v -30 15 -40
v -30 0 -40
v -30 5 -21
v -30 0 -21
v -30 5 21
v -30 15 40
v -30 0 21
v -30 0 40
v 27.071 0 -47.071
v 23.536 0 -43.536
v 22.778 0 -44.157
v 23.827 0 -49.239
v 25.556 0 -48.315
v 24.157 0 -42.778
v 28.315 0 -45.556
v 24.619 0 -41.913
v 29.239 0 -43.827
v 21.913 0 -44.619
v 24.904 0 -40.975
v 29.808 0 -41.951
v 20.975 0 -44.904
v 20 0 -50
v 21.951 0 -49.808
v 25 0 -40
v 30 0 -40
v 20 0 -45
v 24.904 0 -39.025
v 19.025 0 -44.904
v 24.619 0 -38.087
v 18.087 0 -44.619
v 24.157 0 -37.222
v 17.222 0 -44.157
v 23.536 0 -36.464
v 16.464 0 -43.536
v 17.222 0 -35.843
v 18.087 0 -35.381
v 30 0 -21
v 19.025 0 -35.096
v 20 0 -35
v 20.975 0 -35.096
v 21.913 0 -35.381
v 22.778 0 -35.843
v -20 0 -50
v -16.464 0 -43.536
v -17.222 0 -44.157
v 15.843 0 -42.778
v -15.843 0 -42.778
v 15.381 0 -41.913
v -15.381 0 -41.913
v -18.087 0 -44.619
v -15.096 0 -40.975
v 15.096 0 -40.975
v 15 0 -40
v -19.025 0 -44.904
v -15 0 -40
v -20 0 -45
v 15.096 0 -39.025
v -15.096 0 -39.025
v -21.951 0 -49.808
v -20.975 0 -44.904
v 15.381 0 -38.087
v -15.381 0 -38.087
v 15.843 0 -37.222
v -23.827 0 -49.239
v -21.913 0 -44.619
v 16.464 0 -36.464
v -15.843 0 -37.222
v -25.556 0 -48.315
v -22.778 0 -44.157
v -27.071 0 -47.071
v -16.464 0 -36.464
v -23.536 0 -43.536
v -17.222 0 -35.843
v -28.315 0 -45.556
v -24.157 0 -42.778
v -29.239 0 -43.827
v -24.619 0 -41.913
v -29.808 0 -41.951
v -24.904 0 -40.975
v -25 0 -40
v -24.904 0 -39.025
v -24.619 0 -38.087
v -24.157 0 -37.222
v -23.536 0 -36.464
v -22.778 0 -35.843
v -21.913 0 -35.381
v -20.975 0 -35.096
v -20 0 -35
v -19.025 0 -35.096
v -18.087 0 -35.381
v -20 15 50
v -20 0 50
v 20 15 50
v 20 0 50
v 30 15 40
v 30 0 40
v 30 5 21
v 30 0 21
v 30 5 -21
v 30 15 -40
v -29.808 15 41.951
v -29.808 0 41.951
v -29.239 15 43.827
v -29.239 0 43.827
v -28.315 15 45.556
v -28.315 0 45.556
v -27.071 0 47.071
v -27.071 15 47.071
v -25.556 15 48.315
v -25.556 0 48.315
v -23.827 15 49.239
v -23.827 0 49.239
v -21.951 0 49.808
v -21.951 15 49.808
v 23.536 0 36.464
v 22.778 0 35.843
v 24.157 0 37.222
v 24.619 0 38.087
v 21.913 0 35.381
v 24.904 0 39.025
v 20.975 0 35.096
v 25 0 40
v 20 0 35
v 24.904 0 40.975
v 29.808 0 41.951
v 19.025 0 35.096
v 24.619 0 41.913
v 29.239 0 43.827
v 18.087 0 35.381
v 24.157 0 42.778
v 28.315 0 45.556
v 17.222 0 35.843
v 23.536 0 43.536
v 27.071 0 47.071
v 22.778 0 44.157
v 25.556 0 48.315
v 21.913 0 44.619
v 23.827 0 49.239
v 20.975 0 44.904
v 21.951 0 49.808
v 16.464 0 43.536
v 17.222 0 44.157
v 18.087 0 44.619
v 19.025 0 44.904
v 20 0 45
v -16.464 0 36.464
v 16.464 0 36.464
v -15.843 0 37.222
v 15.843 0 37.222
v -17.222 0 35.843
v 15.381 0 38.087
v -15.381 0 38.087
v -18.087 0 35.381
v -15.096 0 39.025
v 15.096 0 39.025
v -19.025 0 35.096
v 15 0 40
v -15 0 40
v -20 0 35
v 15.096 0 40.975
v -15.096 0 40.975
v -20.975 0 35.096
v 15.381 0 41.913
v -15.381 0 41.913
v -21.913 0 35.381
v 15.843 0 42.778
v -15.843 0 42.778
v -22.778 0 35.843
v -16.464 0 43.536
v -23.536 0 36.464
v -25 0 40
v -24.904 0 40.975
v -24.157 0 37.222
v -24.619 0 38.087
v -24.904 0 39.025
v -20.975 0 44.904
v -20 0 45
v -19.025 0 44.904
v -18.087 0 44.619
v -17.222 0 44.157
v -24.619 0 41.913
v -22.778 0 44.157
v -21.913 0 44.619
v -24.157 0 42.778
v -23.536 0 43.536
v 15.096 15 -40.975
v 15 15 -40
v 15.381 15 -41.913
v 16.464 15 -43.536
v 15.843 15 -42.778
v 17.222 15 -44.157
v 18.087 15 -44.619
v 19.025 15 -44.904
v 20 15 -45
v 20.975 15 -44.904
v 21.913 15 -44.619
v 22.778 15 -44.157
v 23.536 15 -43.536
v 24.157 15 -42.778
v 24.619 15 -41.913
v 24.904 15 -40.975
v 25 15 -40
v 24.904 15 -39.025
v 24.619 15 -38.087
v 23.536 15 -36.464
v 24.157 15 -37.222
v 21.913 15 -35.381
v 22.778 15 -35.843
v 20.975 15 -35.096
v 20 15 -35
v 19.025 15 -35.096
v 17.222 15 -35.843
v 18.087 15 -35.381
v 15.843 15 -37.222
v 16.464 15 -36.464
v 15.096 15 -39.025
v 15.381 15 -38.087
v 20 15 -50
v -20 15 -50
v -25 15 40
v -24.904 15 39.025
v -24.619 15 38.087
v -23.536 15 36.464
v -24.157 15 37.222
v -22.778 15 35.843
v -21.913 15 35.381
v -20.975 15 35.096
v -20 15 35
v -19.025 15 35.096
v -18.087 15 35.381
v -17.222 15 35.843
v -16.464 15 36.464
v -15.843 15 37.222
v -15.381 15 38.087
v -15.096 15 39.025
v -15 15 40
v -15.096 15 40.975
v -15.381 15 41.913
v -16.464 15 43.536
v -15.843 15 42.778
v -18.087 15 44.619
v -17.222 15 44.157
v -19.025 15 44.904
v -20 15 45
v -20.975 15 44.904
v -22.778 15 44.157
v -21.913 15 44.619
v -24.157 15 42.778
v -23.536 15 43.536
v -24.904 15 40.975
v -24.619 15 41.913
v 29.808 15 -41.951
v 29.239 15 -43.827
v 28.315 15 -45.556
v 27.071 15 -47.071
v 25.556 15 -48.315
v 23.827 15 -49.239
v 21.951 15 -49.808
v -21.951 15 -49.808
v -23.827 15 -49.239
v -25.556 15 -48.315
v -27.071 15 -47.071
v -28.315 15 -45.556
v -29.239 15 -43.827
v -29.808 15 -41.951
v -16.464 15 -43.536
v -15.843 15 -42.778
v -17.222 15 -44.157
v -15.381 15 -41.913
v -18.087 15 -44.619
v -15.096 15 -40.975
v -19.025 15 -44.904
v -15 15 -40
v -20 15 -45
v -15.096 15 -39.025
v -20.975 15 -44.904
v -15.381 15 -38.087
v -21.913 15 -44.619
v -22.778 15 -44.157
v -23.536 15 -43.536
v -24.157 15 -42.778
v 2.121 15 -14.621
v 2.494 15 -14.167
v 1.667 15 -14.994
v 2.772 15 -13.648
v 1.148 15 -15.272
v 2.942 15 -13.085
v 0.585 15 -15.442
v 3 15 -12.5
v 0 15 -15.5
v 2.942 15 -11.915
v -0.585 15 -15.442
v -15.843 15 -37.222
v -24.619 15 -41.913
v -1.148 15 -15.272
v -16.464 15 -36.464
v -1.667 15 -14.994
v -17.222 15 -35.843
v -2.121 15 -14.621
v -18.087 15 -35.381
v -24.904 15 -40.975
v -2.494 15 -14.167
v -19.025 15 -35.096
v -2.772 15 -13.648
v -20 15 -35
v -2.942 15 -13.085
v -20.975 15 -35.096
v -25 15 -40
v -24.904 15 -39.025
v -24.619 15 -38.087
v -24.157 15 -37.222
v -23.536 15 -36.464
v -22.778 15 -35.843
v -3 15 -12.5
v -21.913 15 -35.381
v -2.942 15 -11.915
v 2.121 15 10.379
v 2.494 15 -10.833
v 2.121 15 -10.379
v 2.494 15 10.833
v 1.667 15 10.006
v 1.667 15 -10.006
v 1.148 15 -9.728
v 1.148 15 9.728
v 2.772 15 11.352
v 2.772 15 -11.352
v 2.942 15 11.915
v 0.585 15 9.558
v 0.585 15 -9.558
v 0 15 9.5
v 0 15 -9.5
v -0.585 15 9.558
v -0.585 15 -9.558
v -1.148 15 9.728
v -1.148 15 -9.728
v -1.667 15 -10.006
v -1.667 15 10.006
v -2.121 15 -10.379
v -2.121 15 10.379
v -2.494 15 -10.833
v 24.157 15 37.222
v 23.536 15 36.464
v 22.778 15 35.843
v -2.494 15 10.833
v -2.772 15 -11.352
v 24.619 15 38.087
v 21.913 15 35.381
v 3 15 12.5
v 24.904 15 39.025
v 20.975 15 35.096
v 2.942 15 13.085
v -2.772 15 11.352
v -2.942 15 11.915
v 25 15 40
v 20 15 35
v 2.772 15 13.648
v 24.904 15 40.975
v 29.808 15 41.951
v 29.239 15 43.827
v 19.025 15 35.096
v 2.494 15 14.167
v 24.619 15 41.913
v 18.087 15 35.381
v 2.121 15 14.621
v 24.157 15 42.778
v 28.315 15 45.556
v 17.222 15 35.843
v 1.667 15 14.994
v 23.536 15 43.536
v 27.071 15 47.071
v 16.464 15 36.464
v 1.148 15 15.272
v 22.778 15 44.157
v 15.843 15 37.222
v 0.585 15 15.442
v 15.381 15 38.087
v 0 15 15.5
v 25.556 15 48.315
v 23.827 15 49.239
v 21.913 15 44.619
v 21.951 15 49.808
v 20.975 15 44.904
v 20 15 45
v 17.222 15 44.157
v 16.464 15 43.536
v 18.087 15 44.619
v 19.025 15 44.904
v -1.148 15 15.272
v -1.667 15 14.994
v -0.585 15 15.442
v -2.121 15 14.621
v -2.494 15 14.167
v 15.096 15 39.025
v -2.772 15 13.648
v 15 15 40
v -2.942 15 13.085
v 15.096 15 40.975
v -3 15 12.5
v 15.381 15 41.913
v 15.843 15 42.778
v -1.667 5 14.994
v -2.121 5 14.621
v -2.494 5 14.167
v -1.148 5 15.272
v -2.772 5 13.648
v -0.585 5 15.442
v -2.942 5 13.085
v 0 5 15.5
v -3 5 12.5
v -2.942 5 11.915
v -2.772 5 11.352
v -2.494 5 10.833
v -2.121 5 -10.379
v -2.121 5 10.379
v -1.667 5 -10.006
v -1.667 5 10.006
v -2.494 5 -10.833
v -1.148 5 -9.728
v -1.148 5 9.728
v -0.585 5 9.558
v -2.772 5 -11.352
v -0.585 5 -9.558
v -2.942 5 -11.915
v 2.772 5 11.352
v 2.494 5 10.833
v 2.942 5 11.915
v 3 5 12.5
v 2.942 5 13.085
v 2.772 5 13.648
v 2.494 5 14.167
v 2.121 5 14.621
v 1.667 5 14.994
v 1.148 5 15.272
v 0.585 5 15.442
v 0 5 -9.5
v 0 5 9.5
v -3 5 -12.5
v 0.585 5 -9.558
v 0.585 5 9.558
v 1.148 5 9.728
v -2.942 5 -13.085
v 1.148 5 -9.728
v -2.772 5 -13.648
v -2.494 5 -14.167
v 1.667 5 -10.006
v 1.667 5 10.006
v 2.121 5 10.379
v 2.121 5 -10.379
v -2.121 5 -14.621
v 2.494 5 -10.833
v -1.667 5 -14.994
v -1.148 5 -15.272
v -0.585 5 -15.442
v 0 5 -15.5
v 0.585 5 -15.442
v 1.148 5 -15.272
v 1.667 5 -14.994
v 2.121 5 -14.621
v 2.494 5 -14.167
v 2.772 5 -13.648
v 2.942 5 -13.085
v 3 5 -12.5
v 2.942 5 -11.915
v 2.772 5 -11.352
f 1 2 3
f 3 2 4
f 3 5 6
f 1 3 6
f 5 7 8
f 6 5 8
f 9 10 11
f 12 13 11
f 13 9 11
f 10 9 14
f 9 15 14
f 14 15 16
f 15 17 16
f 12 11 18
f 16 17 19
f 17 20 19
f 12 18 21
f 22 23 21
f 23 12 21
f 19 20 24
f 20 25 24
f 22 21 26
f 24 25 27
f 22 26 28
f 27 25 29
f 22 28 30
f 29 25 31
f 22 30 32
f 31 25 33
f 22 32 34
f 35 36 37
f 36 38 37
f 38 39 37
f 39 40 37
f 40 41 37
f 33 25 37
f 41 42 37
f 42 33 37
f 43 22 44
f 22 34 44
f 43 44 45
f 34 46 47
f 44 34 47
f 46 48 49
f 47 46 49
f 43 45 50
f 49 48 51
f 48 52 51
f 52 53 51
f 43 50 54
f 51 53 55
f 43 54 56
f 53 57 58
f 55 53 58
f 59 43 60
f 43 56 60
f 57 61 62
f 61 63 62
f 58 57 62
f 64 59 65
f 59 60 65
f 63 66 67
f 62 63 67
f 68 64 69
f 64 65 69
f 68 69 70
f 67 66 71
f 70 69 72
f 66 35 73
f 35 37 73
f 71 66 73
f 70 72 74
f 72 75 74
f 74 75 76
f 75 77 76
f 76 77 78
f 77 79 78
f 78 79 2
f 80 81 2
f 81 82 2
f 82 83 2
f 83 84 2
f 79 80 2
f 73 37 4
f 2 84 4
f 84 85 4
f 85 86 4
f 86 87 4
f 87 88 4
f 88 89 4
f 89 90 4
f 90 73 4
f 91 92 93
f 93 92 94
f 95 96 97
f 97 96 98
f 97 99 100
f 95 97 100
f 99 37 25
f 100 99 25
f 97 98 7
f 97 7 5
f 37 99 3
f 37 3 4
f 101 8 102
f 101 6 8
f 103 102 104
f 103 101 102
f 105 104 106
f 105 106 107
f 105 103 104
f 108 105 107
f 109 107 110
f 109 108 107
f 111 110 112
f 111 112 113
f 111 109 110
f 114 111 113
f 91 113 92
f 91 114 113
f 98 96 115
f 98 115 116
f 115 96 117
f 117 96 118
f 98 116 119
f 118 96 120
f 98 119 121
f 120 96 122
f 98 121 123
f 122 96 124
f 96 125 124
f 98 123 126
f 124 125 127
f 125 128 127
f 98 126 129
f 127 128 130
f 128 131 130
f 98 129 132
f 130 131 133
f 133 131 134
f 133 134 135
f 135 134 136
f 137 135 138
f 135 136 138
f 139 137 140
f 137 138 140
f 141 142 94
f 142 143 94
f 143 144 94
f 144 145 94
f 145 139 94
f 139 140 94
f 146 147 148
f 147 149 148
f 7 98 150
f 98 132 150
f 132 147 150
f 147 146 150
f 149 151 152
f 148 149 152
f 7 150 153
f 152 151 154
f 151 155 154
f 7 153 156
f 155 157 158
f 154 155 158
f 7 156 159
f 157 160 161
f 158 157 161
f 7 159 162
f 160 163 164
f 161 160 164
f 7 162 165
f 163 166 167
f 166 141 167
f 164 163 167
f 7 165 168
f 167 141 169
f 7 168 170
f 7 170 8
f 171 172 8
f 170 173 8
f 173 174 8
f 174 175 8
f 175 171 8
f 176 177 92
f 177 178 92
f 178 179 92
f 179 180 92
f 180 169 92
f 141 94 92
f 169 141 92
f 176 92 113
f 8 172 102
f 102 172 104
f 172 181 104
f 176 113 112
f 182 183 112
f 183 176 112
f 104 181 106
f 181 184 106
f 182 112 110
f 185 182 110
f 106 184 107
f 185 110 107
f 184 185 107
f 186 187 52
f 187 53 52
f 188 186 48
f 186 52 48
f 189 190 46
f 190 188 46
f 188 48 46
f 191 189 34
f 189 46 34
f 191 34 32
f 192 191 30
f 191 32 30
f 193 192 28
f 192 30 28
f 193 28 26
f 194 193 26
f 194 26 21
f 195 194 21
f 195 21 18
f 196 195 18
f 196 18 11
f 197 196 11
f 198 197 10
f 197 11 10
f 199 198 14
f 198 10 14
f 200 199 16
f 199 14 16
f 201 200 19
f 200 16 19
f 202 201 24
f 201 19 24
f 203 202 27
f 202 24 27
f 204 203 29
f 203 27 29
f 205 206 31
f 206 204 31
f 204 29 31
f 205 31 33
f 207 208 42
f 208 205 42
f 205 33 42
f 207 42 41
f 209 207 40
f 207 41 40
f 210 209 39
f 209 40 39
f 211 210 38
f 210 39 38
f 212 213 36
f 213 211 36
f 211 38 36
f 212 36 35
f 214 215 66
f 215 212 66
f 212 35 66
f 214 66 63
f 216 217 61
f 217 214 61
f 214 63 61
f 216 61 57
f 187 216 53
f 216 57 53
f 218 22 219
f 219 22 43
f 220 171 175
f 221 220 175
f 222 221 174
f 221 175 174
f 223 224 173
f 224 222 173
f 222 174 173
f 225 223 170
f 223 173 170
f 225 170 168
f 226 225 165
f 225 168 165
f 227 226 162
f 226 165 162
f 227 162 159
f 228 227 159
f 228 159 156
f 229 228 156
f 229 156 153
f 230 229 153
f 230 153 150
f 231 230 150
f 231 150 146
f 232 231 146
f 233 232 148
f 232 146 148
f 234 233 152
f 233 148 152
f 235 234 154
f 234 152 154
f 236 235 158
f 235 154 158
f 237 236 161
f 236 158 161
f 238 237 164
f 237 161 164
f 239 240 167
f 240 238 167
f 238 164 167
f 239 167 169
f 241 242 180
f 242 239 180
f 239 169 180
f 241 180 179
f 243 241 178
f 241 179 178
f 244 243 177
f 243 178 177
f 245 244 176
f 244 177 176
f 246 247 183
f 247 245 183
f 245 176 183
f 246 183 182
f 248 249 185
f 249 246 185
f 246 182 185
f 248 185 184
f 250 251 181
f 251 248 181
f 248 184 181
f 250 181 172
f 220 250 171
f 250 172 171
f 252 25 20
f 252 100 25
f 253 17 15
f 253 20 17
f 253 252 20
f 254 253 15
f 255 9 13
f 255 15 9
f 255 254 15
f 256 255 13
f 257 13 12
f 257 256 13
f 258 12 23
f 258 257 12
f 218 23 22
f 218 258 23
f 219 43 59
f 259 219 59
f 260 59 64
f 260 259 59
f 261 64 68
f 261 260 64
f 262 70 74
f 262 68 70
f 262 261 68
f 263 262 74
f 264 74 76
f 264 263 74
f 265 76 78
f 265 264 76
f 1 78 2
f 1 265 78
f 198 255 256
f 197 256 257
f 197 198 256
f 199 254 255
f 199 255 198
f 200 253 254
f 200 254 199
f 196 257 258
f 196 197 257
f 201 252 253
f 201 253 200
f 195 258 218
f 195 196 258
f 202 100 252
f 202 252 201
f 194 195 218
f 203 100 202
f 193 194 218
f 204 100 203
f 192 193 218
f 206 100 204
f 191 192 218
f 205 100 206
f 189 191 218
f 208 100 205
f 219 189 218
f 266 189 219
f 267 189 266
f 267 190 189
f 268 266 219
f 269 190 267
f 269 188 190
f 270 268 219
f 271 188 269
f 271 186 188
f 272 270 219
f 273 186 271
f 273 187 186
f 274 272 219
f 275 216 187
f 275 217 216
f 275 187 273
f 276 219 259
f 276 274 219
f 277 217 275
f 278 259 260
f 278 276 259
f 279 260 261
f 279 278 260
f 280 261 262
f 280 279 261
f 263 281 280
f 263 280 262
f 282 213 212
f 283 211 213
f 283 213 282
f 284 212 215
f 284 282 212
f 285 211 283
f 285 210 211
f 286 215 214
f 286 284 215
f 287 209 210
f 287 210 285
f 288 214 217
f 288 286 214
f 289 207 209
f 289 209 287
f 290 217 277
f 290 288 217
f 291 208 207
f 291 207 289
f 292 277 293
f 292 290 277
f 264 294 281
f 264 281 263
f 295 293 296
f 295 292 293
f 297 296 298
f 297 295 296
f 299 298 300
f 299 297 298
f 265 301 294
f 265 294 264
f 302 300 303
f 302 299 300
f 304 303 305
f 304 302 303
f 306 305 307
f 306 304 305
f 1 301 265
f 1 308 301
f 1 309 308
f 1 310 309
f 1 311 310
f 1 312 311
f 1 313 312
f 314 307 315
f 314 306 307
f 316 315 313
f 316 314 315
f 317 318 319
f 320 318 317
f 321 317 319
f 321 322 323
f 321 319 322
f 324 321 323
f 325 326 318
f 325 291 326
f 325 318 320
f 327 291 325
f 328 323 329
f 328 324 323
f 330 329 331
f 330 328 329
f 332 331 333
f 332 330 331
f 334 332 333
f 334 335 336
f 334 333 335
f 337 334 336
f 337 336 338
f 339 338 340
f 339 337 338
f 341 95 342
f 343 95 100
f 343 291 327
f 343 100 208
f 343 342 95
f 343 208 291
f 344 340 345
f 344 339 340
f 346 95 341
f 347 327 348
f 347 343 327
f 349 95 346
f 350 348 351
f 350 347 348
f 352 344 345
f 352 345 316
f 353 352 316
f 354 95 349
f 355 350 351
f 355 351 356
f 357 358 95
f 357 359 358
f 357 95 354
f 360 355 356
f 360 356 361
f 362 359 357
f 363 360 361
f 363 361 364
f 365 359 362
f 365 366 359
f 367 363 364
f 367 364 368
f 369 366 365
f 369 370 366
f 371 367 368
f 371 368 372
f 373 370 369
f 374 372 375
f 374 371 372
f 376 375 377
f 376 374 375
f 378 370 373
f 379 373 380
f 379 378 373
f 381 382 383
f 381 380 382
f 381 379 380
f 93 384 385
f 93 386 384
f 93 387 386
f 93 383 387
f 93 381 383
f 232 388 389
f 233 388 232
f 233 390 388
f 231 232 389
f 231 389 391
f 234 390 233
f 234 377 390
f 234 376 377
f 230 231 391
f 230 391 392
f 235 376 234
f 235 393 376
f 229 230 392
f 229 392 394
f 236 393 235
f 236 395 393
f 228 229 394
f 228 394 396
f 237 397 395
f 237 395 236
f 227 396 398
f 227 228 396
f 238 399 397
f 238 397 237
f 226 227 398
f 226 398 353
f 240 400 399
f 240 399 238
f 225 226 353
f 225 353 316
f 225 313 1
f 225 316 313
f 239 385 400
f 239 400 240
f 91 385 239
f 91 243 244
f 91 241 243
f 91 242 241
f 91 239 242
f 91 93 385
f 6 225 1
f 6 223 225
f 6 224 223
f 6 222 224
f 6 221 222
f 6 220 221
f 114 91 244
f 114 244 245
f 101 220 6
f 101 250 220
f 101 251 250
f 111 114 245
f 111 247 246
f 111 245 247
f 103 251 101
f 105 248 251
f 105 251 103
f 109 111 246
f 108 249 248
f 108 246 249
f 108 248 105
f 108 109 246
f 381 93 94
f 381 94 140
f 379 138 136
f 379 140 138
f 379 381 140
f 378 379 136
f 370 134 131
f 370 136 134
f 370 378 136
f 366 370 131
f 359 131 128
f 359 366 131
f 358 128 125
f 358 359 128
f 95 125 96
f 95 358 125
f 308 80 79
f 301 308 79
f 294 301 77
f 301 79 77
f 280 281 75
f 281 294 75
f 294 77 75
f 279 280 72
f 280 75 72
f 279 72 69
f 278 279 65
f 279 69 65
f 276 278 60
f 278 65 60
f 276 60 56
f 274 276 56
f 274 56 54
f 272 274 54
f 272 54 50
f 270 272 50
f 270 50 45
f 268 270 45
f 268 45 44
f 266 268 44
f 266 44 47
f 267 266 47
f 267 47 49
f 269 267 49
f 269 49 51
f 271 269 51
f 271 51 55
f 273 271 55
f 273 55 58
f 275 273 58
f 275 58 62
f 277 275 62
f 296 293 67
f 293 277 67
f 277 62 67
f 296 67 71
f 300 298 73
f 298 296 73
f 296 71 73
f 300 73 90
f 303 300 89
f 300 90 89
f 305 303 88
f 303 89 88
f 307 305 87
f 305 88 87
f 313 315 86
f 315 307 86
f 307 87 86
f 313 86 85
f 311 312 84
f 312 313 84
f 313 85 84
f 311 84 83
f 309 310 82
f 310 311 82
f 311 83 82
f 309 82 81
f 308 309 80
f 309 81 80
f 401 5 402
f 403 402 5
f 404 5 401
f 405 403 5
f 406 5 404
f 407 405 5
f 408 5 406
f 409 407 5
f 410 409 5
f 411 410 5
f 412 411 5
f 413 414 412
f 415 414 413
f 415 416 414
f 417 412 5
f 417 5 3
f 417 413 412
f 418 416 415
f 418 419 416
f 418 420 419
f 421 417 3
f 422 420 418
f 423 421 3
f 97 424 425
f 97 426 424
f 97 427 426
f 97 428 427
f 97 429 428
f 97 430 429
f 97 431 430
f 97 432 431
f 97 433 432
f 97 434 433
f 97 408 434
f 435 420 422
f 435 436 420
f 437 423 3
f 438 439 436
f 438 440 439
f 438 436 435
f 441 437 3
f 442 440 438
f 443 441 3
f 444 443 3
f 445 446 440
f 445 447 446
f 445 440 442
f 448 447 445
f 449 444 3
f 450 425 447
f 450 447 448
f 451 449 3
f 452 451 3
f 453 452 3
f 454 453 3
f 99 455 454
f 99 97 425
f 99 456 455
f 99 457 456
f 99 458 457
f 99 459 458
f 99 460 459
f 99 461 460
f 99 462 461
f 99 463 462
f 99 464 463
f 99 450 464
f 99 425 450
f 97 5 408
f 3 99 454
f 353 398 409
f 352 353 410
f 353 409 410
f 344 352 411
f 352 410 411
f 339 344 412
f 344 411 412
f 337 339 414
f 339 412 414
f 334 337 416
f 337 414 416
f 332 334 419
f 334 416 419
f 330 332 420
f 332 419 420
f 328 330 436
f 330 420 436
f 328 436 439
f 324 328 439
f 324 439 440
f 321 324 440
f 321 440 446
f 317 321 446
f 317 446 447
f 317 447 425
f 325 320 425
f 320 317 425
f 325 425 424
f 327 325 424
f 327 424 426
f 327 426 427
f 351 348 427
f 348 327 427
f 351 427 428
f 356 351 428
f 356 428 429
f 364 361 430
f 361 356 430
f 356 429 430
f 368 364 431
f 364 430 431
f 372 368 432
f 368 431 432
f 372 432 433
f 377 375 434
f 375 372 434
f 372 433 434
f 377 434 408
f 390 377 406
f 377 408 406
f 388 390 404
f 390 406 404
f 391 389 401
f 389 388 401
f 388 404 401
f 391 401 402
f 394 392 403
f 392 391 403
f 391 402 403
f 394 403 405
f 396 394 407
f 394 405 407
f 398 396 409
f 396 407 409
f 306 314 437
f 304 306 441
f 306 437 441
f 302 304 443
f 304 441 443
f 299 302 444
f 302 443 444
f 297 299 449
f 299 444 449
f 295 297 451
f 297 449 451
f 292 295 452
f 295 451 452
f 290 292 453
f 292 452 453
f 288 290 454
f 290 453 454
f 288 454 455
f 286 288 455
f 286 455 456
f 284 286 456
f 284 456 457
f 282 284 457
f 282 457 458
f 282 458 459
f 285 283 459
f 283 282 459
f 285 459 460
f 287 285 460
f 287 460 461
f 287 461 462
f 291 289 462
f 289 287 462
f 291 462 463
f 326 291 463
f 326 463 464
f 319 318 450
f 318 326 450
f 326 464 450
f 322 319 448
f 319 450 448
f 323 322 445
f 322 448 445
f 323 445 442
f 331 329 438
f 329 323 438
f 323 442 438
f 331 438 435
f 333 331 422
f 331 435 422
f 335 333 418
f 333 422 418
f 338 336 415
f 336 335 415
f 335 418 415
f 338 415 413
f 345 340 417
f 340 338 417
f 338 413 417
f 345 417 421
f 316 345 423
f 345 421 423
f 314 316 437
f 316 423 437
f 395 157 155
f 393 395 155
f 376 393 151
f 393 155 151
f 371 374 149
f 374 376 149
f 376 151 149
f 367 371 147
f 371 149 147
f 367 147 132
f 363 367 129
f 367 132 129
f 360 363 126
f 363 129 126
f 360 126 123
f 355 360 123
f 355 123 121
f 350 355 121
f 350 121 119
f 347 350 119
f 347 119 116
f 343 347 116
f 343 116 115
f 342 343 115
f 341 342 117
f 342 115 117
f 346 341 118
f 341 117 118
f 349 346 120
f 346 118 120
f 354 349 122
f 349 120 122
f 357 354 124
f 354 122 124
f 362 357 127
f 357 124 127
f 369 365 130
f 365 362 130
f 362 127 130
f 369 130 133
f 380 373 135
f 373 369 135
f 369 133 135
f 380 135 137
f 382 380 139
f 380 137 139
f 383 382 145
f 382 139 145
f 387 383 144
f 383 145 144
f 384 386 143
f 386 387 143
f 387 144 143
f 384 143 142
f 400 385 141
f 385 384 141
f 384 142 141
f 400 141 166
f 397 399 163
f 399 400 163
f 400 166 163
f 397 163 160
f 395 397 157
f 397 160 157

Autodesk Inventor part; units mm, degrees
ref_plane "YZ Plane" through (0, 0, 0) normal (1, 0, 0) x (0, 1, 0)
ref_plane "XZ Plane" through (0, 0, 0) normal (0, 1, 0) x (-1, 0, 0)
ref_plane "XY Plane" through (0, 0, 0) normal (0, 0, 1) x (1, 0, 0)
sketch "Sketch1" plane through (0, 0, 0) normal (0, 1, 0) x (-1, 0, 0)
  line L0 (30, 50) -> (-30, 50)
  line L1 (-30, 50) -> (-30, -50)
  line L2 (-30, -50) -> (30, -50)
  line L3 (30, -50) -> (30, 50)
  line L4 (30, 0) -> (-30, 0) construction
  line L5 (0, 50) -> (0, -50) construction
  circle A0 centre (20, 40) radius 5
  circle A1 centre (-20, 40) radius 5
  circle A2 centre (20, -40) radius 5
  circle A3 centre (-20, -40) radius 5
  circle A4 centre (0, -12.5) radius 3
  circle A5 centre (0, 12.5) radius 3
  point P0 (0, 0)
  point P1 (0, 0)
  dimension "d0" = 60
  dimension "d1" = 100
  dimension "d2" = 10
  dimension "d3" = 40
  dimension "d4" = 80
  dimension "d14" = 6
  dimension "d15" = 25
extrude "Extrusion1" add sketch "Sketch1" along normal blind 15
fillet "Fillet1" radius 10 4 edges at (30, 7.5, 50) (30, 7.5, -50) (-30, 7.5, 50) (-30, 7.5, -50)
sketch "Sketch2" plane through (30, 0, 40) normal (1, 0, 0) x (0, 0, -1)
  line L0 (80, 15) -> (80, 0) construction
  line L1 (0, 15) -> (80, 15) construction
  line L2 (0, 0) -> (0, 15) construction
  line L3 (0, 0) -> (80, 0) construction
  line L4 (19, 5) -> (61, 5)
  line L5 (61, 5) -> (61, 0)
  line L6 (61, 0) -> (19, 0)
  line L7 (19, 0) -> (19, 5)
  line L8 (40, 0) -> (40, 15) construction
  line L9 (0, 15) -> (80, 15) construction
  point P0 (40, 5)
  dimension "d9" = 42
  dimension "d10" = 5
extrude "Extrusion2" cut sketch "Sketch2" against normal through all
properties part number "base_obj1"
